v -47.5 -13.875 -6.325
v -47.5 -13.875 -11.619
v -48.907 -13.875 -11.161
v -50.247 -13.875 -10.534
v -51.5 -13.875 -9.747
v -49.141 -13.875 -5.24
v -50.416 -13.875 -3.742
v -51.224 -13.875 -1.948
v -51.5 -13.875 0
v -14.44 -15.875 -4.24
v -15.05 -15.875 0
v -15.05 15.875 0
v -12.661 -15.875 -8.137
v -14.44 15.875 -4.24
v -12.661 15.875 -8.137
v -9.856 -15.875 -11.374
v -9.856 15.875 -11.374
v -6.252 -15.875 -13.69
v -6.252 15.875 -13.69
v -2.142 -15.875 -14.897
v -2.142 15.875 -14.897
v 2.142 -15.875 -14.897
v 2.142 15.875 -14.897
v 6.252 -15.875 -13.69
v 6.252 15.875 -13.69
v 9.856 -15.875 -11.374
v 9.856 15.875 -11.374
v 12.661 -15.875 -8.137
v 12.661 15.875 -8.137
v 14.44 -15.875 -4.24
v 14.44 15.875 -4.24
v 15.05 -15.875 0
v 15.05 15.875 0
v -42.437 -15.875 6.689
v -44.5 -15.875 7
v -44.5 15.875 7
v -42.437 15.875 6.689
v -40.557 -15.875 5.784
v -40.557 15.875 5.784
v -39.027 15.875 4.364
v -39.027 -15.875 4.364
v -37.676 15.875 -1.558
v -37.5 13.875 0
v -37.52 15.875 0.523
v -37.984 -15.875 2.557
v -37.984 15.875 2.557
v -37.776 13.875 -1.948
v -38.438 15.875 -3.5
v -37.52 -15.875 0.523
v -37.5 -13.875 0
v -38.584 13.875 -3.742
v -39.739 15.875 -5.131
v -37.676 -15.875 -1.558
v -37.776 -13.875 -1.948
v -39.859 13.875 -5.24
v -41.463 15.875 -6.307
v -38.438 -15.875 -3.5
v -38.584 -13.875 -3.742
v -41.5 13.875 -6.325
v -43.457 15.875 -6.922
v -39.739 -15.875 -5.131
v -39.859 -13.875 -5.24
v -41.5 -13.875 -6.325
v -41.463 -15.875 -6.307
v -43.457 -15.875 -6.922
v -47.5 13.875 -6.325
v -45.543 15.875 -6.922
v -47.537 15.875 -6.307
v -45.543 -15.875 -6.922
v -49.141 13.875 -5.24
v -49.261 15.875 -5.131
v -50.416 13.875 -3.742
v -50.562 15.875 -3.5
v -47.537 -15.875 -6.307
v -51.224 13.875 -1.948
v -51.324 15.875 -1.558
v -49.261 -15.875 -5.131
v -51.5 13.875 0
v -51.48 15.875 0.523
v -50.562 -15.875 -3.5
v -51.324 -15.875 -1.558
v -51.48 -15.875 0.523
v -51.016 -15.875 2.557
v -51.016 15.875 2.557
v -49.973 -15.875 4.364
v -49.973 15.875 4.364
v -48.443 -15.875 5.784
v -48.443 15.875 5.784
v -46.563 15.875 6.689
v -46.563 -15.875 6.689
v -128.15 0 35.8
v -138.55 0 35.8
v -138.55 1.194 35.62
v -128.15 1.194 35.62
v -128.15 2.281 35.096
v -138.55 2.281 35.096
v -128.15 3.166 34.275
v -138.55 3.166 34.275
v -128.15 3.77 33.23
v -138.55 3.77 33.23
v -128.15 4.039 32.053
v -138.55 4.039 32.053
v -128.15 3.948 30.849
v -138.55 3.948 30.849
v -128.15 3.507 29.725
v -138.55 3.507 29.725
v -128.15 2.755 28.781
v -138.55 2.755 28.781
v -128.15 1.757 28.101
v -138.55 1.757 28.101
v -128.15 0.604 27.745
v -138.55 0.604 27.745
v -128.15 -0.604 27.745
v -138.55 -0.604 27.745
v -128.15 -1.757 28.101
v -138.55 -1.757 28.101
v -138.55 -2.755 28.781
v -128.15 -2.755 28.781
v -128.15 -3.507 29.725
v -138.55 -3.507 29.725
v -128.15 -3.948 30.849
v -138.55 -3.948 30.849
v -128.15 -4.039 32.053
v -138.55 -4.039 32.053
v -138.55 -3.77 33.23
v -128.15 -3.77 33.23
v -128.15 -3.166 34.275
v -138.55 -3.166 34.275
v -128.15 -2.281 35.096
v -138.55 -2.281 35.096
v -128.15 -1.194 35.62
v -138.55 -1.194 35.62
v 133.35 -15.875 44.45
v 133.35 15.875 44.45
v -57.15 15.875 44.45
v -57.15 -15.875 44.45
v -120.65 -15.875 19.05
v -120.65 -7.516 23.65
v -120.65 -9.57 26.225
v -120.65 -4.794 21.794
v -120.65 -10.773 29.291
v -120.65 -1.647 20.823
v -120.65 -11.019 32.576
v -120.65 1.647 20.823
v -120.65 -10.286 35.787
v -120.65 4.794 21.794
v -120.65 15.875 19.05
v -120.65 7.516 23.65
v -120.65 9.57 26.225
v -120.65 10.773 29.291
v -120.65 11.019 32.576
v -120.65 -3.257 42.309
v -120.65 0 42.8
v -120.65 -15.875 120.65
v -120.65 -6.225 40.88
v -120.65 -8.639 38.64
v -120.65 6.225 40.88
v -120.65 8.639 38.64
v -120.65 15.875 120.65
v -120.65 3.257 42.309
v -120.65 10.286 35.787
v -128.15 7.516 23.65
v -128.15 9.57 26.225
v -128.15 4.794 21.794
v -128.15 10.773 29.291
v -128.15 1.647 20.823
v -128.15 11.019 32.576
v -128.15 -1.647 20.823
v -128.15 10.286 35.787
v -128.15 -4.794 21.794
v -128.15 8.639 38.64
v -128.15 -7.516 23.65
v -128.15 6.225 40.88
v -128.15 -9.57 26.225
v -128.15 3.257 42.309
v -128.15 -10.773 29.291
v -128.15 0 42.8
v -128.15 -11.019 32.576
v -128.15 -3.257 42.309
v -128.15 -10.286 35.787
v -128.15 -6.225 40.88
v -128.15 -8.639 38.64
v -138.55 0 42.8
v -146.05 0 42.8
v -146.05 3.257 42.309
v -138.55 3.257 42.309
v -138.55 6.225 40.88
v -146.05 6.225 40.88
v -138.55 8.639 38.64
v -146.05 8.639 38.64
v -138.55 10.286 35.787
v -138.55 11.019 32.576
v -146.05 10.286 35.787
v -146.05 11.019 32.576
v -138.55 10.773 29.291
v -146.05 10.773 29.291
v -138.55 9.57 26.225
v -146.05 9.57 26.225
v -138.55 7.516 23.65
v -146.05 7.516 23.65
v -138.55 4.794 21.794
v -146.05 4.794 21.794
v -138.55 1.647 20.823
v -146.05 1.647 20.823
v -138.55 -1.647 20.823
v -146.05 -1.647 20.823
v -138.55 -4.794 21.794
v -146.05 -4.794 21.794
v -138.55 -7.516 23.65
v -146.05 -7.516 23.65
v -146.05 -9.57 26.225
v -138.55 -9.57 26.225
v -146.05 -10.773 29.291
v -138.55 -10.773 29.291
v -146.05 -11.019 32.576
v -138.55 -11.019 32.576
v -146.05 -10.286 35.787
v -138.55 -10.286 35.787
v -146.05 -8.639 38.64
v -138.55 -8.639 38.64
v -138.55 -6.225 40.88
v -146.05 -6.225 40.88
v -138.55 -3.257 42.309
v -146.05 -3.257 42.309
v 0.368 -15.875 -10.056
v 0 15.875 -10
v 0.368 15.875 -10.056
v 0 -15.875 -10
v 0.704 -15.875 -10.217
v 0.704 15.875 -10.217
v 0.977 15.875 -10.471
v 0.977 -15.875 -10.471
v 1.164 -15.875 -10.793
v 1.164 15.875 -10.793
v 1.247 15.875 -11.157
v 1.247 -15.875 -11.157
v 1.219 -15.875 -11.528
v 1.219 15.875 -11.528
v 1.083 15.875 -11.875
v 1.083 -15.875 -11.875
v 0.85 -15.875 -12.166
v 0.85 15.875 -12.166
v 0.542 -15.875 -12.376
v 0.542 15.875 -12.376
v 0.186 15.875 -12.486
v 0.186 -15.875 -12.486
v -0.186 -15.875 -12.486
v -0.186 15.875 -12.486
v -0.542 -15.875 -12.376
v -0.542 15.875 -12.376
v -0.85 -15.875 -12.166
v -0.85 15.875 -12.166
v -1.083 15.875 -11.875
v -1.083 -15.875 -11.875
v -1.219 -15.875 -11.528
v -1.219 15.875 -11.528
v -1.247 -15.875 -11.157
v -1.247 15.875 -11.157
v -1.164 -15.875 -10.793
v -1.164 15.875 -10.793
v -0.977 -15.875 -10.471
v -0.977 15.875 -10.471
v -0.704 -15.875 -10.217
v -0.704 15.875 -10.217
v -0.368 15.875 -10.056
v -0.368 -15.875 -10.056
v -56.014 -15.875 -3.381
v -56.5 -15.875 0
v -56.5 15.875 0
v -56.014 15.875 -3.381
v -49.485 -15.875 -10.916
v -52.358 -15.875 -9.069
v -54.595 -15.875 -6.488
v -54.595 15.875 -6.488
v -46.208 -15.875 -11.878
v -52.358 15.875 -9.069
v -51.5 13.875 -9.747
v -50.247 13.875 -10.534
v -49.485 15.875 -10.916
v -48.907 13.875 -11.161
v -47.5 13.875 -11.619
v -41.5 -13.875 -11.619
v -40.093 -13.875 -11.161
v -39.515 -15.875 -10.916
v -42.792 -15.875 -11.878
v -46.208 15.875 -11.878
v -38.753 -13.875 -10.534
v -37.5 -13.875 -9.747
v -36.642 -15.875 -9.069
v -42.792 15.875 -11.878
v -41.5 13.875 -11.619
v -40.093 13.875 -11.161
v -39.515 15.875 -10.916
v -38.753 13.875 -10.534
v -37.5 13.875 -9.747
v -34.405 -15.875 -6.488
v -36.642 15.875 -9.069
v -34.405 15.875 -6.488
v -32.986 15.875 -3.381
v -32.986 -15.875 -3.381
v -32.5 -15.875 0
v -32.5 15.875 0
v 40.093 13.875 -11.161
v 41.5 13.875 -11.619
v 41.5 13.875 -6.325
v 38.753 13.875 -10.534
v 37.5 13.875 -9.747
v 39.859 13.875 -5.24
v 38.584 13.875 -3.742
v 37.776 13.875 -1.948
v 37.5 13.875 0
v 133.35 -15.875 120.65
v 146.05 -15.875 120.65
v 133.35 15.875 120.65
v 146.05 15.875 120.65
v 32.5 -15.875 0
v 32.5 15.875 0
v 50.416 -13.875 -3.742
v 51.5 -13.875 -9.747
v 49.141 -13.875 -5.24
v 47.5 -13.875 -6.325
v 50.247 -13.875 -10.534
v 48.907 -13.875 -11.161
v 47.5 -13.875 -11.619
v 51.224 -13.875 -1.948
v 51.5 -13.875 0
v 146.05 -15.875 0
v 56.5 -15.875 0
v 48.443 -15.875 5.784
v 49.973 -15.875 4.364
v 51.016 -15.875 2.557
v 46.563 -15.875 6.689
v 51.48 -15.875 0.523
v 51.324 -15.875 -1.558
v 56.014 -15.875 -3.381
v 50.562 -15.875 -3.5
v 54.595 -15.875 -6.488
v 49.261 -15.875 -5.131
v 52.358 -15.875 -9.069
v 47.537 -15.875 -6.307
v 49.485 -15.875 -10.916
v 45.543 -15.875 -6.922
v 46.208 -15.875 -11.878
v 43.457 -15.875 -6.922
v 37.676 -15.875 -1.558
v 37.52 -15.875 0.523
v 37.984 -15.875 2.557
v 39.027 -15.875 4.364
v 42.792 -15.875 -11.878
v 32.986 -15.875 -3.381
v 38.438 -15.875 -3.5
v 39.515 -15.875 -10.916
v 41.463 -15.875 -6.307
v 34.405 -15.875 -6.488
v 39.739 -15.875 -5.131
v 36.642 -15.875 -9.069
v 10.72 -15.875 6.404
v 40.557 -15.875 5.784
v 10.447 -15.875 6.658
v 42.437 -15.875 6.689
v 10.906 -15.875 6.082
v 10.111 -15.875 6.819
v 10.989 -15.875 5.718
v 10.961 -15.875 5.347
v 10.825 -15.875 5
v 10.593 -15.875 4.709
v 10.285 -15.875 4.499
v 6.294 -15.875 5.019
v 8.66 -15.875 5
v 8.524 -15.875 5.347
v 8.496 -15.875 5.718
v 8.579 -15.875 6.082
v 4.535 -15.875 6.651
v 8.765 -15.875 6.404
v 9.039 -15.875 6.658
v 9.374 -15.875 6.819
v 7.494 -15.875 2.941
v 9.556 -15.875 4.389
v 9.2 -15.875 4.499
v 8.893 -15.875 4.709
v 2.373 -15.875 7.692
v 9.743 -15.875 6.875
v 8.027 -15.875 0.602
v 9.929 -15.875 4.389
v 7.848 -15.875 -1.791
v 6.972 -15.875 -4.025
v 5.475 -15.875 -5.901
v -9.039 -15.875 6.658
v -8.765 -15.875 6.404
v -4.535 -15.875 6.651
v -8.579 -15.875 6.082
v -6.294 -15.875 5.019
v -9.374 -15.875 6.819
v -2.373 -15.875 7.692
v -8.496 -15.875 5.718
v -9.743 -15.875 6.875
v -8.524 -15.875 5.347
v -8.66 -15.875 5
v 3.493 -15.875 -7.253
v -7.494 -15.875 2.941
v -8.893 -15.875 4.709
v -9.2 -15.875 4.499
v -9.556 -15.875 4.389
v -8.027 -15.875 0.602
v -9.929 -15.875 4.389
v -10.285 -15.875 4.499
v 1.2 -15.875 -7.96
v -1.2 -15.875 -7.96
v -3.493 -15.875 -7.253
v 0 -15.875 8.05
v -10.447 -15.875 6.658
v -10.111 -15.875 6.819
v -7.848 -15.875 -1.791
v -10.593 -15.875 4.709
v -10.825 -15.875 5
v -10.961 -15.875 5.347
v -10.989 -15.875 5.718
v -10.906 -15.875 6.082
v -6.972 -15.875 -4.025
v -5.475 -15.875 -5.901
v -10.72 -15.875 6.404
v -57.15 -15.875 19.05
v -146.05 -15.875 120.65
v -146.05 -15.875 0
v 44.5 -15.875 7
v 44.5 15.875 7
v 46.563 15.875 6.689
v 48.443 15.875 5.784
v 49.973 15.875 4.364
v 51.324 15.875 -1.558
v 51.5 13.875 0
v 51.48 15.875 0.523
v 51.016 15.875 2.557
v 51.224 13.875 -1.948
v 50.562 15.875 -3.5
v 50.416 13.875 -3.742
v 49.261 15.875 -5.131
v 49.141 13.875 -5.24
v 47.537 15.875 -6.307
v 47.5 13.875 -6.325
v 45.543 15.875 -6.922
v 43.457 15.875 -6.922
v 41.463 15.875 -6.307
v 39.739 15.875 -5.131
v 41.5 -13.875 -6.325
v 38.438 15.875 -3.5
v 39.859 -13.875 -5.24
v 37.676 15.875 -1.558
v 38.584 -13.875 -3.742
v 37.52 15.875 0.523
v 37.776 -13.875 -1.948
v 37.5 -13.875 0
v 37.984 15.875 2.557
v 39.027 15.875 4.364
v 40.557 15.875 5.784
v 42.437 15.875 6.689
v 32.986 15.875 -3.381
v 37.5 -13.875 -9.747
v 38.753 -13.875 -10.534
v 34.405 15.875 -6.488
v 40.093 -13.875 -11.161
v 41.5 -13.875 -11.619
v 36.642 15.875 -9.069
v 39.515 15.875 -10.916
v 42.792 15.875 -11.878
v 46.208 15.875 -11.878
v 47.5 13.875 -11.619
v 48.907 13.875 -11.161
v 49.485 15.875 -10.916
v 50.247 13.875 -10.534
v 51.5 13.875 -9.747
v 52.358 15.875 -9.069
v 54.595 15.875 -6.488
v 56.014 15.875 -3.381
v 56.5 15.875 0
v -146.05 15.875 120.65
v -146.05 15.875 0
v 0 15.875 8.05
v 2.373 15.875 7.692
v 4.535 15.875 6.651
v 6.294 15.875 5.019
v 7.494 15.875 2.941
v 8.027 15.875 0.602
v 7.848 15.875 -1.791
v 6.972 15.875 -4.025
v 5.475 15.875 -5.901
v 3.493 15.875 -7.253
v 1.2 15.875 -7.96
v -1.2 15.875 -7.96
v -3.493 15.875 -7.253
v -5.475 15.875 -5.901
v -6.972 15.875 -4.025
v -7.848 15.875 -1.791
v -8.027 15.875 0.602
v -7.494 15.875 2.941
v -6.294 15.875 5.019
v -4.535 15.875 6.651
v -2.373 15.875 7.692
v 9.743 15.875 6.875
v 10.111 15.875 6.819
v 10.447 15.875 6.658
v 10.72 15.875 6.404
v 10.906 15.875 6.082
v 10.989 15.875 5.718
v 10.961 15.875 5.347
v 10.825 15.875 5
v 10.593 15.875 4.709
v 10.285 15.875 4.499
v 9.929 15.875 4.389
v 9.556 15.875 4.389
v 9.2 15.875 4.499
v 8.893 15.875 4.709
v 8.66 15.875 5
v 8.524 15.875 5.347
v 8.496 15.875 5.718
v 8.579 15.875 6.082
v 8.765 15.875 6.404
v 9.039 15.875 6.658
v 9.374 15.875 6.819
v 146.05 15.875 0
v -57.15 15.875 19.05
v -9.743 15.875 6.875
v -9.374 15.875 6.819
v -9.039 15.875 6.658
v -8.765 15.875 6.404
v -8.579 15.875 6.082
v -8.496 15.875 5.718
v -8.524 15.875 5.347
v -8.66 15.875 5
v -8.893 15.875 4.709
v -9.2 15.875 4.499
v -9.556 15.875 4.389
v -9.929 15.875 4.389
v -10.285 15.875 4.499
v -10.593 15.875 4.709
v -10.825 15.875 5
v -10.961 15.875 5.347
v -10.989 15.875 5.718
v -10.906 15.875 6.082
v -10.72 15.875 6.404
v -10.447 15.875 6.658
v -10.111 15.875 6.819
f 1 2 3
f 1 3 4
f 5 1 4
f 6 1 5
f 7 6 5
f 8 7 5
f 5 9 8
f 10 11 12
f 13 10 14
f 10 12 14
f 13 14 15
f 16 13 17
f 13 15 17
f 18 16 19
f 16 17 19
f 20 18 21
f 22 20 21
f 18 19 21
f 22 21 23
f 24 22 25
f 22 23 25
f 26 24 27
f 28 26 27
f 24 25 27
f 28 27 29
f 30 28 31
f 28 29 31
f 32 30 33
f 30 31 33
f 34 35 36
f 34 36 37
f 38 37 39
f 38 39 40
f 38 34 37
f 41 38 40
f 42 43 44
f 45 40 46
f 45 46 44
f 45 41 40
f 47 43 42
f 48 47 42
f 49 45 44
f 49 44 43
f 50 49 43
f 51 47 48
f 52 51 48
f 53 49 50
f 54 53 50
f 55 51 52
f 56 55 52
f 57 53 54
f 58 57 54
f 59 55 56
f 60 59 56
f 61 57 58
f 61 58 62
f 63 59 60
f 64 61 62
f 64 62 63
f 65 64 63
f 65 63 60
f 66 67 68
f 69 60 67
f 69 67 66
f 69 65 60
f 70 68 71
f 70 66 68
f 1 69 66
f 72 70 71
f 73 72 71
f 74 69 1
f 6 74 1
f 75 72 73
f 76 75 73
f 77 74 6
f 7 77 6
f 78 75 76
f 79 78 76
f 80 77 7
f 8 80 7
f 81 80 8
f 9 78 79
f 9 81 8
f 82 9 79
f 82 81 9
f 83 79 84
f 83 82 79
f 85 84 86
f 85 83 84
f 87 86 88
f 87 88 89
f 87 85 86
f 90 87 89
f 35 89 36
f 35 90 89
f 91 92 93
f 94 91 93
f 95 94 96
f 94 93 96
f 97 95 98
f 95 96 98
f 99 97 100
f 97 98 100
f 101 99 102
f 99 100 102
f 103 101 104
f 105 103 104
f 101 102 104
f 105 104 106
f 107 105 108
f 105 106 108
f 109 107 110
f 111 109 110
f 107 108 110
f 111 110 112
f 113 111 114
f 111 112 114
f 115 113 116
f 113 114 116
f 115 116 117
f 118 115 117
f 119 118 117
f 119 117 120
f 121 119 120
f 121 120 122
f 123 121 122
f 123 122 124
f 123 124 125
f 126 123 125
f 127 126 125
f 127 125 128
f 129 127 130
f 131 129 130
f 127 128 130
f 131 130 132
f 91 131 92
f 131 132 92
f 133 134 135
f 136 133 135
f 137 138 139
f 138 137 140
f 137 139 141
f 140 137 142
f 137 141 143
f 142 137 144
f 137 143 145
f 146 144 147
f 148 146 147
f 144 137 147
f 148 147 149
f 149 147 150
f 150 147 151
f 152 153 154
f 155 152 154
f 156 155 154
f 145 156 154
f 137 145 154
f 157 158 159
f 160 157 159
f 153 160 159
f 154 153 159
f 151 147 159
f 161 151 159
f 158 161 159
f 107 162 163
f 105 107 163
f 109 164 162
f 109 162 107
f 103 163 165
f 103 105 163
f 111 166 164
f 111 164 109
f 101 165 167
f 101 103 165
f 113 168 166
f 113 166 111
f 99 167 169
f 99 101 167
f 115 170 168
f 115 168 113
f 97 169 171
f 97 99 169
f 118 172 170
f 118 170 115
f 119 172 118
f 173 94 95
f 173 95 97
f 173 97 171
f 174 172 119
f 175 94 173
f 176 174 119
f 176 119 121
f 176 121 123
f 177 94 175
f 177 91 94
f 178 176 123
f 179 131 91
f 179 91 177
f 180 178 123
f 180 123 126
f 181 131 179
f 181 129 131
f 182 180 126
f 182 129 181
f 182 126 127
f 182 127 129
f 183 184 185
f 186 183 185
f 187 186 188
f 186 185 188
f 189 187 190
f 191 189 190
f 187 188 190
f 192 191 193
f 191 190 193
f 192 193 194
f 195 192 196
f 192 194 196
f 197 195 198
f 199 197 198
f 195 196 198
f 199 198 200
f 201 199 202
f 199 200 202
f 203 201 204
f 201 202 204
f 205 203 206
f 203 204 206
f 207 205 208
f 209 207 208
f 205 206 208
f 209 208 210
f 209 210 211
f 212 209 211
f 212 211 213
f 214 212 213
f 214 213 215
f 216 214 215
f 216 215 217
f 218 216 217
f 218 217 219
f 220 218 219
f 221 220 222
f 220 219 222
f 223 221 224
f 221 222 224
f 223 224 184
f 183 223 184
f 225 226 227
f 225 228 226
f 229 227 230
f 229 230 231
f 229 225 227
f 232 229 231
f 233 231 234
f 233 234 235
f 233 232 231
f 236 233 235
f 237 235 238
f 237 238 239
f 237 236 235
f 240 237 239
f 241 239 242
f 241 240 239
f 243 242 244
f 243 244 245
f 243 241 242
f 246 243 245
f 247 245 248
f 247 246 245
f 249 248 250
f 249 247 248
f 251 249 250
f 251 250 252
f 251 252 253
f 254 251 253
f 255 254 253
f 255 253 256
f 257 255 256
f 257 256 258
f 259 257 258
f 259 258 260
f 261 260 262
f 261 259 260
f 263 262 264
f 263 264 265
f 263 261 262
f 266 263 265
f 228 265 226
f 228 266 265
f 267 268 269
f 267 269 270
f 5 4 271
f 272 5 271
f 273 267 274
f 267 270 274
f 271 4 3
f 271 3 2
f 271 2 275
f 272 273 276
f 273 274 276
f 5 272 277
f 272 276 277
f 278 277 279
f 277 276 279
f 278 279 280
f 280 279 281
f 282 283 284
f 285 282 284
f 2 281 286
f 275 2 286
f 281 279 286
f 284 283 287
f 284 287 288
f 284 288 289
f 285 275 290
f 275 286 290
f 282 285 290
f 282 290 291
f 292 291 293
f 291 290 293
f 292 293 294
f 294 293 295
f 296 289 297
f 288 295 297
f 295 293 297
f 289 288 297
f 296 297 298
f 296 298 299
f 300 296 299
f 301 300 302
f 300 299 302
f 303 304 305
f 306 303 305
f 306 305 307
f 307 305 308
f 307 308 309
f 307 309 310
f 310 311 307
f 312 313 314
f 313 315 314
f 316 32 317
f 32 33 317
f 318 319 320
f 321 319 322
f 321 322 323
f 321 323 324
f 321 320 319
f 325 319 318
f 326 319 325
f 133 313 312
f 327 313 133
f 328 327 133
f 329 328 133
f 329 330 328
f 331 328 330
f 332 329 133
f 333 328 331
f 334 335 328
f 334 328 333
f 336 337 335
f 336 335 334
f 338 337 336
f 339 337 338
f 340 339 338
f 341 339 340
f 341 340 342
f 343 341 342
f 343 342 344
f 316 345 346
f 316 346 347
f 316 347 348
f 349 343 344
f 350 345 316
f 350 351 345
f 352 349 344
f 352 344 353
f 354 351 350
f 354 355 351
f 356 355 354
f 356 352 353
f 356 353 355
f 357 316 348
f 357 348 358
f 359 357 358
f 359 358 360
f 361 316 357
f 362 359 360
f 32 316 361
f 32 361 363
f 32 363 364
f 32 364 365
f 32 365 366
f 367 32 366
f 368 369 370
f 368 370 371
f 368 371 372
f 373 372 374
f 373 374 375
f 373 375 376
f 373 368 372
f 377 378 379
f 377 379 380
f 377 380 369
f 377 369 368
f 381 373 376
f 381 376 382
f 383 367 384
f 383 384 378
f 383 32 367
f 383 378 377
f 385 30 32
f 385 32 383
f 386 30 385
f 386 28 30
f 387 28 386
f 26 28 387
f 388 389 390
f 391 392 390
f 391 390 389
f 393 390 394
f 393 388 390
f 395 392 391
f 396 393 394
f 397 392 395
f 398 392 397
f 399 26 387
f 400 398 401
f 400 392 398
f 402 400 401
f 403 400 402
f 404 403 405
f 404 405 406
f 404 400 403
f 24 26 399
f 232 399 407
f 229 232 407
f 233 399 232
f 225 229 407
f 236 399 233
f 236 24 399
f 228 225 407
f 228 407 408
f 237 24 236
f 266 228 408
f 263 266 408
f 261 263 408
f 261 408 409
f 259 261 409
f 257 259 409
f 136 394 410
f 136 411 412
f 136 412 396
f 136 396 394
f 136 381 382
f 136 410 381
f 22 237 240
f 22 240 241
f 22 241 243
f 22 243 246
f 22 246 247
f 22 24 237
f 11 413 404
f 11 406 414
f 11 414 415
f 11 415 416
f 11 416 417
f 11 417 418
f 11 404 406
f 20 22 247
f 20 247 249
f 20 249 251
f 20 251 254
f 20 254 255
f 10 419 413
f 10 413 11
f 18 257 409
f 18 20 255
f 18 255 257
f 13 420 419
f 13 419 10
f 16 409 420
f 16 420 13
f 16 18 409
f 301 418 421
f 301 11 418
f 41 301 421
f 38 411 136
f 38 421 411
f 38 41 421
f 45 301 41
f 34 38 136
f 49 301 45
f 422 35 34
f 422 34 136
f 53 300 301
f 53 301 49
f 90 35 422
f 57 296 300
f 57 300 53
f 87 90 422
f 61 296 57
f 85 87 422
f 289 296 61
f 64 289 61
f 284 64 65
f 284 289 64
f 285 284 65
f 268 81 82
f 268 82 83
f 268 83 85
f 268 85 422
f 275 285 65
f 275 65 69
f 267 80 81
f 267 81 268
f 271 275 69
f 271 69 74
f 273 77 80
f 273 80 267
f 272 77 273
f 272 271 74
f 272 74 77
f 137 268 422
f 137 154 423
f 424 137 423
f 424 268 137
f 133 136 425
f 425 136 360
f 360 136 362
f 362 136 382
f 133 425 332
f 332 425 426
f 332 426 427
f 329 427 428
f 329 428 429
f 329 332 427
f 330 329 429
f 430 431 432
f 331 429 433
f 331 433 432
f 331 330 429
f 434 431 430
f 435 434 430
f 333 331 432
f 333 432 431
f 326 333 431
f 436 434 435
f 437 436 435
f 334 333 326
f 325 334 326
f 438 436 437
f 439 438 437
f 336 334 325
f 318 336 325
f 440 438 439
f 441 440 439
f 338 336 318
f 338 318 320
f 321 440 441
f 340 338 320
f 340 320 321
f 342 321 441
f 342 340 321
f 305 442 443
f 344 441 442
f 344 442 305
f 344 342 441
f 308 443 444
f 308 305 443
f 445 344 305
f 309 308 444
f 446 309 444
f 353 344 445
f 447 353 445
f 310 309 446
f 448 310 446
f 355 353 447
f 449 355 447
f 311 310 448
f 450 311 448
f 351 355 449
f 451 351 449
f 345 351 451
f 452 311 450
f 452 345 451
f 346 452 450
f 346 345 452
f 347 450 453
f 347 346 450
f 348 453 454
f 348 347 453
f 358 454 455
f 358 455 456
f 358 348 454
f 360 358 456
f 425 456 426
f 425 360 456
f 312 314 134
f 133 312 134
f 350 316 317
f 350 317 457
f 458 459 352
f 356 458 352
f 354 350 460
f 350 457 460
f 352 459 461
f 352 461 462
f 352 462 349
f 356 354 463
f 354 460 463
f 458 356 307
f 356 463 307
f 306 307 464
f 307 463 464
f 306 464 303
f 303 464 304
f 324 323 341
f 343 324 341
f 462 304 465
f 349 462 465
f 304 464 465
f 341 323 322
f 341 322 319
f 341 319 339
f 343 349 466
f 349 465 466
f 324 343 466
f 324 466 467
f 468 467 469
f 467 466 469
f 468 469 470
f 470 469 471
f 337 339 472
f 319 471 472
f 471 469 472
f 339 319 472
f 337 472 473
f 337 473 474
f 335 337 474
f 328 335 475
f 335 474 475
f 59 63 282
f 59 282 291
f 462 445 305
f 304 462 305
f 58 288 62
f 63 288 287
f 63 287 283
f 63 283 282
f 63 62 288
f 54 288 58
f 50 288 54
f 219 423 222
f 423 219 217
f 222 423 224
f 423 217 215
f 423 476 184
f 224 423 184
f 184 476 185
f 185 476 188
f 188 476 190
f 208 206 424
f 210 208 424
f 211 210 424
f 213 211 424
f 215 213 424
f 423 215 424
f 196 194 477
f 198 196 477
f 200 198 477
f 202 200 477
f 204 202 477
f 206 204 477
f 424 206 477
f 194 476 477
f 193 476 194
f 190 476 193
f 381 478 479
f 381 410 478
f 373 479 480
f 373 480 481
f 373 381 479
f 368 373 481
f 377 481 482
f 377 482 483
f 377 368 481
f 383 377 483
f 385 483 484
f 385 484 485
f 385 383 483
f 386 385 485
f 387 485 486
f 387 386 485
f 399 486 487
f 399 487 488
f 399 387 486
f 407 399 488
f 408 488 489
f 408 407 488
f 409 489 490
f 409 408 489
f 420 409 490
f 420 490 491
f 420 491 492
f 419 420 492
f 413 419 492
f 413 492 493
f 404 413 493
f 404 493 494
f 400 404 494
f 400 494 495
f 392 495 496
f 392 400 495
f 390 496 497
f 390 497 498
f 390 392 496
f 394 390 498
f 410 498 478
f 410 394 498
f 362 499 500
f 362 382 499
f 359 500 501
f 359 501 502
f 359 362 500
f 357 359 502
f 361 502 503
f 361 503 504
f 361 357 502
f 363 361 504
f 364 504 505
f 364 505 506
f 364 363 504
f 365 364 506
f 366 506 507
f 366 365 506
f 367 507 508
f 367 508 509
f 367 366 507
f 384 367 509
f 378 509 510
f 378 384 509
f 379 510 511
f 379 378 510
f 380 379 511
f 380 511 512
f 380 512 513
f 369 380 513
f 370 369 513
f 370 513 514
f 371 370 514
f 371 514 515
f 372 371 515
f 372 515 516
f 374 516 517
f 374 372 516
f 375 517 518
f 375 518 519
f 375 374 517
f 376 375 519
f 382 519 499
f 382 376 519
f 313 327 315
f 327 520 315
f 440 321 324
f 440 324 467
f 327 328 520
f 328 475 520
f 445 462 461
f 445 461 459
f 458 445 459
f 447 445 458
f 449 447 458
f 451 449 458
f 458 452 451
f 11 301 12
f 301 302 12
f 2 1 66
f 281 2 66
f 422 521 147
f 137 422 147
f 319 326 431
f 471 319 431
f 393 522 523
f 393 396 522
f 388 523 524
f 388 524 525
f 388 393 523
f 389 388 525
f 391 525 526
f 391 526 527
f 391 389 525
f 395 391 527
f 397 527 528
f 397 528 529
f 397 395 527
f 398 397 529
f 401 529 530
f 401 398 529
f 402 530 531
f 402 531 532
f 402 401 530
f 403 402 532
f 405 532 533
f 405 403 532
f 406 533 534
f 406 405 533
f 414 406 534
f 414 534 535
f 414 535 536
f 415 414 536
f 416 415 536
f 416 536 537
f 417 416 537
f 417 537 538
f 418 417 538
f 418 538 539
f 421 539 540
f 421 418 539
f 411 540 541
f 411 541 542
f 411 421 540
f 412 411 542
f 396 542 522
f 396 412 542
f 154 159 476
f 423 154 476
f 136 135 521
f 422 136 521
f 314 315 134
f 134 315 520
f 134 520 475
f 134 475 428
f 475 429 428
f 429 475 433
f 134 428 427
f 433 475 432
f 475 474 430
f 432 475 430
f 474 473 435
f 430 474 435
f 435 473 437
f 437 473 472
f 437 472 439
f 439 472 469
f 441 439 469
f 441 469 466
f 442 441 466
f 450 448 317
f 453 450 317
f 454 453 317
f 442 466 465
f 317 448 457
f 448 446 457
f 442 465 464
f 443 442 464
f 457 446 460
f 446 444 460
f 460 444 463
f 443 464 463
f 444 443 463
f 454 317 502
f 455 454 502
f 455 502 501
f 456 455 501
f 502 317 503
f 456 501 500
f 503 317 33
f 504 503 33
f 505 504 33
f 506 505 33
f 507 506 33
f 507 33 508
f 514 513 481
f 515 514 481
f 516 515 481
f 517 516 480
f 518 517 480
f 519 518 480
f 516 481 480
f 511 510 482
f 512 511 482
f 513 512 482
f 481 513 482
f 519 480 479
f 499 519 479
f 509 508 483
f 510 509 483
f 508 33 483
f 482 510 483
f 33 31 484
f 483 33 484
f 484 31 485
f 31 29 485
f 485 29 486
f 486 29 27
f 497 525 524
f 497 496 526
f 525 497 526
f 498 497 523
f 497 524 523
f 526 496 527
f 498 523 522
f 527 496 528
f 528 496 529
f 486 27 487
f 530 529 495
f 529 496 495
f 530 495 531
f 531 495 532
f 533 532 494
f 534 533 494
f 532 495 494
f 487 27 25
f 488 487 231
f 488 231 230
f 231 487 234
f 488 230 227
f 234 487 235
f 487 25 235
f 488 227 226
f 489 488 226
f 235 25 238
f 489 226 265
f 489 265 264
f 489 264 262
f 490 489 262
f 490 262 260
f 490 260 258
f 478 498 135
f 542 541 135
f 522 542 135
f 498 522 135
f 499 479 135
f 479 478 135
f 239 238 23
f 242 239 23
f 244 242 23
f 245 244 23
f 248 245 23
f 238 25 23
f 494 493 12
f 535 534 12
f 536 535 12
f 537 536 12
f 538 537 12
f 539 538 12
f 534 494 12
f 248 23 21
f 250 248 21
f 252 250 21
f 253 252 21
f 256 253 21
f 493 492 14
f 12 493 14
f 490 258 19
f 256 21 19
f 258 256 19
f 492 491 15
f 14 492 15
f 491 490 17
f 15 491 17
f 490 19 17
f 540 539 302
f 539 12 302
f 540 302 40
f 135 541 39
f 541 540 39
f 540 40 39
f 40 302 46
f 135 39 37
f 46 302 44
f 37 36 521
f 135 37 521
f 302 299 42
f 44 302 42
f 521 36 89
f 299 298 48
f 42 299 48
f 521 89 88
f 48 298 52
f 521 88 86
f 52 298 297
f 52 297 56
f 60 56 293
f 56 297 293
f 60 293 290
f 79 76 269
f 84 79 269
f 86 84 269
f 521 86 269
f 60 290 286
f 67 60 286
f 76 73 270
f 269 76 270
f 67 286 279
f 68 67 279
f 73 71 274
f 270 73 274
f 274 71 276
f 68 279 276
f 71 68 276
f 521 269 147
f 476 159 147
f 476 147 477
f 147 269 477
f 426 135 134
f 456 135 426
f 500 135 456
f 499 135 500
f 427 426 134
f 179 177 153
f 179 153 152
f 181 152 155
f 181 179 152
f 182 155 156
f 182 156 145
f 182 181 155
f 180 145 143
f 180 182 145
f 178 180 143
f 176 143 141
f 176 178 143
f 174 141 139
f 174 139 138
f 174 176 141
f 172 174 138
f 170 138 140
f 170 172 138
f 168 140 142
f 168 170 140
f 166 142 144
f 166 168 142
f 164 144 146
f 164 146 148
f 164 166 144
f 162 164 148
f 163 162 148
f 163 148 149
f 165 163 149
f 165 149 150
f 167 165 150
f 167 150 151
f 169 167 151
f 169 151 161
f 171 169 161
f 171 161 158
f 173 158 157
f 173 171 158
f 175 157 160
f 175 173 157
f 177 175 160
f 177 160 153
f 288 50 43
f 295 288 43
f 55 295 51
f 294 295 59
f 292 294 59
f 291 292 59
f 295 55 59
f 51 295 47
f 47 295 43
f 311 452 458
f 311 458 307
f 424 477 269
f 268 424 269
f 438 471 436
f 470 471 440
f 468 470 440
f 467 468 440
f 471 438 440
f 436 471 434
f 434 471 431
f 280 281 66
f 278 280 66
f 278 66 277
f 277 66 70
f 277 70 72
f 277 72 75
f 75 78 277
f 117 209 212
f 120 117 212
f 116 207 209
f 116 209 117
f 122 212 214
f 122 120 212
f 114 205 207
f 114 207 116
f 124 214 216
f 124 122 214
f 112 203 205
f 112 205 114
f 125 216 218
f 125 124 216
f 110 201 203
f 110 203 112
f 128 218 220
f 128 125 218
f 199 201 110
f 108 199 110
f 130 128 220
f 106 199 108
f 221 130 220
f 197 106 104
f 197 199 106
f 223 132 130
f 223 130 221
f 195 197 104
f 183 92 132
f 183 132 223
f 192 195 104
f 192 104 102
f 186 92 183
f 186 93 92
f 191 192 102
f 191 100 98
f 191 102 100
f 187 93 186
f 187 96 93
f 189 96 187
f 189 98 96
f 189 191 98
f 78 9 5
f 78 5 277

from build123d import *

# Parameters (mm, degrees)
SKETCH1_R           = 8.05
SKETCH1_R_2         = 7
SKETCH1_R_3         = 1.25
BOSS_EXTRUDE1_DEPTH = 15.875
SKETCH2_R           = 11.05
CUT_EXTRUDE1_DEPTH  = 7.5
CUT_EXTRUDE3_START  = -7.5
SKETCH3_R           = 11.05
CUT_EXTRUDE3_DEPTH  = 7.5
SKETCH4_R           = 4.05
CUT_EXTRUDE4_DEPTH  = 10.4
SKETCH5_W           = 4
SKETCH5_H           = 27.75
CUT_EXTRUDE5_DEPTH  = 191.102710725


with BuildPart() as part:
    # Sketch1 → Boss-Extrude1 (new, symmetric)
    with BuildSketch(Plane(origin=(0, 0, 0), x_dir=(1, 0, 0), z_dir=(0, 1, 0))):
        with BuildLine():
            Line((-146.05, 0), (-56.5, 0))
            ThreePointArc((-56.5, 0), (-44.5, 12), (-32.5, 0))
            Line((-32.5, 0), (-15.05, 0))
            ThreePointArc((-15.05, 0), (0, 15.05), (15.05, 0))
            Line((15.05, 0), (32.5, 0))
            ThreePointArc((32.5, 0), (44.5, 12), (56.5, 0))
            Line((56.5, 0), (146.05, 0))
            Line((146.05, 0), (146.05, -120.65))
            Line((146.05, -120.65), (133.35, -120.65))
            Line((133.35, -120.65), (133.35, -44.45))
            Line((133.35, -44.45), (-57.15, -44.45))
            Line((-57.15, -44.45), (-57.15, -19.05))
            Line((-57.15, -19.05), (-120.65, -19.05))
            Line((-120.65, -19.05), (-120.65, -120.65))
            Line((-120.65, -120.65), (-146.05, -120.65))
            Line((-146.05, -120.65), (-146.05, 0))
        make_face()
        with Locations(Location((0, 0, 0), (0, 0, 270))):
            Circle(SKETCH1_R, mode=Mode.SUBTRACT)
        with Locations(Location((-44.5, 0, 0), (0, 0, 270))):
            Circle(SKETCH1_R_2, mode=Mode.SUBTRACT)
        with Locations(Location((44.5, 0, 0), (0, 0, 270))):
            Circle(SKETCH1_R_2, mode=Mode.SUBTRACT)
        with Locations(Location((0, 11.25, 0), (0, 0, 270))):
            Circle(SKETCH1_R_3, mode=Mode.SUBTRACT)
        with Locations(Location((9.742785793, -5.625, 0), (0, 0, 270))):
            Circle(SKETCH1_R_3, mode=Mode.SUBTRACT)
        with Locations(Location((-9.742785793, -5.625, 0), (0, 0, 270))):
            Circle(SKETCH1_R_3, mode=Mode.SUBTRACT)
    extrude(amount=BOSS_EXTRUDE1_DEPTH, both=True)

    # Sketch2 → Cut-Extrude1 (cut)
    with BuildSketch(Plane.ZY.offset(146.05)):
        with Locations((31.75, 0)):
            Circle(SKETCH2_R)
    extrude(amount=-CUT_EXTRUDE1_DEPTH, mode=Mode.SUBTRACT)

    # Sketch3 → Cut-Extrude3 (cut)
    with BuildSketch(Plane(origin=(-120.65, 0, 0), x_dir=(0, 0, -1), z_dir=(1, 0, 0)).offset(CUT_EXTRUDE3_START)):
        with Locations(Location((-31.75, 0, 0), (0, 0, 180))):
            Circle(SKETCH3_R)
    extrude(amount=CUT_EXTRUDE3_DEPTH, mode=Mode.SUBTRACT)

    # Sketch4 → Cut-Extrude4 (cut)
    with BuildSketch(Plane.ZY.offset(138.55)):
        with Locations((31.75, 0)):
            Circle(SKETCH4_R)
    extrude(amount=-CUT_EXTRUDE4_DEPTH, mode=Mode.SUBTRACT)

    # Sketch5 → Cut-Extrude5 (cut, through all)
    with BuildSketch(Plane(origin=(0, 0, 0), x_dir=(-1, 0, 0), z_dir=(0, 0, -1))):
        with Locations((-49.5, 0)):
            Rectangle(SKETCH5_W, SKETCH5_H)
        with Locations((-39.5, 0)):
            Rectangle(SKETCH5_W, SKETCH5_H)
        with Locations((49.5, 0)):
            Rectangle(SKETCH5_W, SKETCH5_H)
        with Locations((39.5, 0)):
            Rectangle(SKETCH5_W, SKETCH5_H)
    extrude(amount=CUT_EXTRUDE5_DEPTH, mode=Mode.SUBTRACT)


solid = part.part
